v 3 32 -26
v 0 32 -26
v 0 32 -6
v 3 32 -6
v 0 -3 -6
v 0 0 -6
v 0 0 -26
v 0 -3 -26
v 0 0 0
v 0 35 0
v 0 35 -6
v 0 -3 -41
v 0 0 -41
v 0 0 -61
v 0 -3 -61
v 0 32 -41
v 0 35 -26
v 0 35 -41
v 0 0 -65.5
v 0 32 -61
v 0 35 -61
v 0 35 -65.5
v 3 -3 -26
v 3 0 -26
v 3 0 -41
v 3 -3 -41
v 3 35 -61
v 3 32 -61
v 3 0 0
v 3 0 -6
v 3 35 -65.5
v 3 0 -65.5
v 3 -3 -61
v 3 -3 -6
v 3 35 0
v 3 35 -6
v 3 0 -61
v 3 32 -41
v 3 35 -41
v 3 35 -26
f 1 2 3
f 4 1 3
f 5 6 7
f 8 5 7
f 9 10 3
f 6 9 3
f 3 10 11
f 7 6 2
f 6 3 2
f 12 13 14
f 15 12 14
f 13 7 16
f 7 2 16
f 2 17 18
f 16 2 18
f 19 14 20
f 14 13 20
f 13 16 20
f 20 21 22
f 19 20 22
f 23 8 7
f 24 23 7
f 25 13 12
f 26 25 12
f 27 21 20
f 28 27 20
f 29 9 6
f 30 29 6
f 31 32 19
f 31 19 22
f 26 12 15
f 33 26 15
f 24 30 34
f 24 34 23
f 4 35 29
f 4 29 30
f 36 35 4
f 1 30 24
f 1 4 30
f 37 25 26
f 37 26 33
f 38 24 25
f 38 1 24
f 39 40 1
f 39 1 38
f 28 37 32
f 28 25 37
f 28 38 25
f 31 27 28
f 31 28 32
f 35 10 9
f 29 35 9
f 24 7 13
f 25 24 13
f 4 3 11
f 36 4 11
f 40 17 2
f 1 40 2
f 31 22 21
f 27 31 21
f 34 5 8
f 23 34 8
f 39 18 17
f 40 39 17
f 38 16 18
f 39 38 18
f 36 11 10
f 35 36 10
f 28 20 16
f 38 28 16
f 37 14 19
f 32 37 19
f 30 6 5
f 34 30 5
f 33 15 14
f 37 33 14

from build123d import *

# Parameters (mm, degrees)
BOSS_EXTRUDE1_DEPTH = 3
SKETCH2_W           = 211.5
SKETCH2_H           = 45
CUT_EXTRUDE1_DEPTH  = 10


with BuildPart() as part:
    # Sketch1 → Boss-Extrude1 (new body)
    with BuildSketch(Plane(origin=(0, 0, 0), x_dir=(0, 0, -1), z_dir=(1, 0, 0))):
        Polygon((26, 0), (41, 0), (41, -3), (61, -3), (61, 0), (76, 0), (76, -3), (96, -3), (96, 0), (111, 0), (111, -3), (131, -3), (131, 0), (146, 0), (146, -3), (166, -3), (166, 0), (181, 0), (181, -3), (201, -3), (201, 0), (216, 0), (216, -3), (236, -3), (236, 0), (251, 0), (251, -3), (271, -3), (271, 0), (277, 0), (277, 35), (271, 35), (271, 32), (251, 32), (251, 35), (236, 35), (236, 32), (216, 32), (216, 35), (201, 35), (201, 32), (181, 32), (181, 35), (166, 35), (166, 32), (146, 32), (146, 35), (131, 35), (131, 32), (111, 32), (111, 35), (96, 35), (96, 32), (76, 32), (76, 35), (61, 35), (61, 32), (41, 32), (41, 35), (26, 35), (26, 32), (6, 32), (6, 35), (0, 35), (0, 0), (6, 0), (6, -3), (26, -3), align=None)
    extrude(amount=BOSS_EXTRUDE1_DEPTH)

    # Sketch2 → Cut-Extrude1 (cut)
    with BuildSketch(Plane(origin=(3, 0, 0), x_dir=(0, 0, -1), z_dir=(1, 0, 0))):
        with Locations((171.25, 17.5)):
            Rectangle(SKETCH2_W, SKETCH2_H)
    extrude(amount=-CUT_EXTRUDE1_DEPTH, mode=Mode.SUBTRACT)


solid = part.part
